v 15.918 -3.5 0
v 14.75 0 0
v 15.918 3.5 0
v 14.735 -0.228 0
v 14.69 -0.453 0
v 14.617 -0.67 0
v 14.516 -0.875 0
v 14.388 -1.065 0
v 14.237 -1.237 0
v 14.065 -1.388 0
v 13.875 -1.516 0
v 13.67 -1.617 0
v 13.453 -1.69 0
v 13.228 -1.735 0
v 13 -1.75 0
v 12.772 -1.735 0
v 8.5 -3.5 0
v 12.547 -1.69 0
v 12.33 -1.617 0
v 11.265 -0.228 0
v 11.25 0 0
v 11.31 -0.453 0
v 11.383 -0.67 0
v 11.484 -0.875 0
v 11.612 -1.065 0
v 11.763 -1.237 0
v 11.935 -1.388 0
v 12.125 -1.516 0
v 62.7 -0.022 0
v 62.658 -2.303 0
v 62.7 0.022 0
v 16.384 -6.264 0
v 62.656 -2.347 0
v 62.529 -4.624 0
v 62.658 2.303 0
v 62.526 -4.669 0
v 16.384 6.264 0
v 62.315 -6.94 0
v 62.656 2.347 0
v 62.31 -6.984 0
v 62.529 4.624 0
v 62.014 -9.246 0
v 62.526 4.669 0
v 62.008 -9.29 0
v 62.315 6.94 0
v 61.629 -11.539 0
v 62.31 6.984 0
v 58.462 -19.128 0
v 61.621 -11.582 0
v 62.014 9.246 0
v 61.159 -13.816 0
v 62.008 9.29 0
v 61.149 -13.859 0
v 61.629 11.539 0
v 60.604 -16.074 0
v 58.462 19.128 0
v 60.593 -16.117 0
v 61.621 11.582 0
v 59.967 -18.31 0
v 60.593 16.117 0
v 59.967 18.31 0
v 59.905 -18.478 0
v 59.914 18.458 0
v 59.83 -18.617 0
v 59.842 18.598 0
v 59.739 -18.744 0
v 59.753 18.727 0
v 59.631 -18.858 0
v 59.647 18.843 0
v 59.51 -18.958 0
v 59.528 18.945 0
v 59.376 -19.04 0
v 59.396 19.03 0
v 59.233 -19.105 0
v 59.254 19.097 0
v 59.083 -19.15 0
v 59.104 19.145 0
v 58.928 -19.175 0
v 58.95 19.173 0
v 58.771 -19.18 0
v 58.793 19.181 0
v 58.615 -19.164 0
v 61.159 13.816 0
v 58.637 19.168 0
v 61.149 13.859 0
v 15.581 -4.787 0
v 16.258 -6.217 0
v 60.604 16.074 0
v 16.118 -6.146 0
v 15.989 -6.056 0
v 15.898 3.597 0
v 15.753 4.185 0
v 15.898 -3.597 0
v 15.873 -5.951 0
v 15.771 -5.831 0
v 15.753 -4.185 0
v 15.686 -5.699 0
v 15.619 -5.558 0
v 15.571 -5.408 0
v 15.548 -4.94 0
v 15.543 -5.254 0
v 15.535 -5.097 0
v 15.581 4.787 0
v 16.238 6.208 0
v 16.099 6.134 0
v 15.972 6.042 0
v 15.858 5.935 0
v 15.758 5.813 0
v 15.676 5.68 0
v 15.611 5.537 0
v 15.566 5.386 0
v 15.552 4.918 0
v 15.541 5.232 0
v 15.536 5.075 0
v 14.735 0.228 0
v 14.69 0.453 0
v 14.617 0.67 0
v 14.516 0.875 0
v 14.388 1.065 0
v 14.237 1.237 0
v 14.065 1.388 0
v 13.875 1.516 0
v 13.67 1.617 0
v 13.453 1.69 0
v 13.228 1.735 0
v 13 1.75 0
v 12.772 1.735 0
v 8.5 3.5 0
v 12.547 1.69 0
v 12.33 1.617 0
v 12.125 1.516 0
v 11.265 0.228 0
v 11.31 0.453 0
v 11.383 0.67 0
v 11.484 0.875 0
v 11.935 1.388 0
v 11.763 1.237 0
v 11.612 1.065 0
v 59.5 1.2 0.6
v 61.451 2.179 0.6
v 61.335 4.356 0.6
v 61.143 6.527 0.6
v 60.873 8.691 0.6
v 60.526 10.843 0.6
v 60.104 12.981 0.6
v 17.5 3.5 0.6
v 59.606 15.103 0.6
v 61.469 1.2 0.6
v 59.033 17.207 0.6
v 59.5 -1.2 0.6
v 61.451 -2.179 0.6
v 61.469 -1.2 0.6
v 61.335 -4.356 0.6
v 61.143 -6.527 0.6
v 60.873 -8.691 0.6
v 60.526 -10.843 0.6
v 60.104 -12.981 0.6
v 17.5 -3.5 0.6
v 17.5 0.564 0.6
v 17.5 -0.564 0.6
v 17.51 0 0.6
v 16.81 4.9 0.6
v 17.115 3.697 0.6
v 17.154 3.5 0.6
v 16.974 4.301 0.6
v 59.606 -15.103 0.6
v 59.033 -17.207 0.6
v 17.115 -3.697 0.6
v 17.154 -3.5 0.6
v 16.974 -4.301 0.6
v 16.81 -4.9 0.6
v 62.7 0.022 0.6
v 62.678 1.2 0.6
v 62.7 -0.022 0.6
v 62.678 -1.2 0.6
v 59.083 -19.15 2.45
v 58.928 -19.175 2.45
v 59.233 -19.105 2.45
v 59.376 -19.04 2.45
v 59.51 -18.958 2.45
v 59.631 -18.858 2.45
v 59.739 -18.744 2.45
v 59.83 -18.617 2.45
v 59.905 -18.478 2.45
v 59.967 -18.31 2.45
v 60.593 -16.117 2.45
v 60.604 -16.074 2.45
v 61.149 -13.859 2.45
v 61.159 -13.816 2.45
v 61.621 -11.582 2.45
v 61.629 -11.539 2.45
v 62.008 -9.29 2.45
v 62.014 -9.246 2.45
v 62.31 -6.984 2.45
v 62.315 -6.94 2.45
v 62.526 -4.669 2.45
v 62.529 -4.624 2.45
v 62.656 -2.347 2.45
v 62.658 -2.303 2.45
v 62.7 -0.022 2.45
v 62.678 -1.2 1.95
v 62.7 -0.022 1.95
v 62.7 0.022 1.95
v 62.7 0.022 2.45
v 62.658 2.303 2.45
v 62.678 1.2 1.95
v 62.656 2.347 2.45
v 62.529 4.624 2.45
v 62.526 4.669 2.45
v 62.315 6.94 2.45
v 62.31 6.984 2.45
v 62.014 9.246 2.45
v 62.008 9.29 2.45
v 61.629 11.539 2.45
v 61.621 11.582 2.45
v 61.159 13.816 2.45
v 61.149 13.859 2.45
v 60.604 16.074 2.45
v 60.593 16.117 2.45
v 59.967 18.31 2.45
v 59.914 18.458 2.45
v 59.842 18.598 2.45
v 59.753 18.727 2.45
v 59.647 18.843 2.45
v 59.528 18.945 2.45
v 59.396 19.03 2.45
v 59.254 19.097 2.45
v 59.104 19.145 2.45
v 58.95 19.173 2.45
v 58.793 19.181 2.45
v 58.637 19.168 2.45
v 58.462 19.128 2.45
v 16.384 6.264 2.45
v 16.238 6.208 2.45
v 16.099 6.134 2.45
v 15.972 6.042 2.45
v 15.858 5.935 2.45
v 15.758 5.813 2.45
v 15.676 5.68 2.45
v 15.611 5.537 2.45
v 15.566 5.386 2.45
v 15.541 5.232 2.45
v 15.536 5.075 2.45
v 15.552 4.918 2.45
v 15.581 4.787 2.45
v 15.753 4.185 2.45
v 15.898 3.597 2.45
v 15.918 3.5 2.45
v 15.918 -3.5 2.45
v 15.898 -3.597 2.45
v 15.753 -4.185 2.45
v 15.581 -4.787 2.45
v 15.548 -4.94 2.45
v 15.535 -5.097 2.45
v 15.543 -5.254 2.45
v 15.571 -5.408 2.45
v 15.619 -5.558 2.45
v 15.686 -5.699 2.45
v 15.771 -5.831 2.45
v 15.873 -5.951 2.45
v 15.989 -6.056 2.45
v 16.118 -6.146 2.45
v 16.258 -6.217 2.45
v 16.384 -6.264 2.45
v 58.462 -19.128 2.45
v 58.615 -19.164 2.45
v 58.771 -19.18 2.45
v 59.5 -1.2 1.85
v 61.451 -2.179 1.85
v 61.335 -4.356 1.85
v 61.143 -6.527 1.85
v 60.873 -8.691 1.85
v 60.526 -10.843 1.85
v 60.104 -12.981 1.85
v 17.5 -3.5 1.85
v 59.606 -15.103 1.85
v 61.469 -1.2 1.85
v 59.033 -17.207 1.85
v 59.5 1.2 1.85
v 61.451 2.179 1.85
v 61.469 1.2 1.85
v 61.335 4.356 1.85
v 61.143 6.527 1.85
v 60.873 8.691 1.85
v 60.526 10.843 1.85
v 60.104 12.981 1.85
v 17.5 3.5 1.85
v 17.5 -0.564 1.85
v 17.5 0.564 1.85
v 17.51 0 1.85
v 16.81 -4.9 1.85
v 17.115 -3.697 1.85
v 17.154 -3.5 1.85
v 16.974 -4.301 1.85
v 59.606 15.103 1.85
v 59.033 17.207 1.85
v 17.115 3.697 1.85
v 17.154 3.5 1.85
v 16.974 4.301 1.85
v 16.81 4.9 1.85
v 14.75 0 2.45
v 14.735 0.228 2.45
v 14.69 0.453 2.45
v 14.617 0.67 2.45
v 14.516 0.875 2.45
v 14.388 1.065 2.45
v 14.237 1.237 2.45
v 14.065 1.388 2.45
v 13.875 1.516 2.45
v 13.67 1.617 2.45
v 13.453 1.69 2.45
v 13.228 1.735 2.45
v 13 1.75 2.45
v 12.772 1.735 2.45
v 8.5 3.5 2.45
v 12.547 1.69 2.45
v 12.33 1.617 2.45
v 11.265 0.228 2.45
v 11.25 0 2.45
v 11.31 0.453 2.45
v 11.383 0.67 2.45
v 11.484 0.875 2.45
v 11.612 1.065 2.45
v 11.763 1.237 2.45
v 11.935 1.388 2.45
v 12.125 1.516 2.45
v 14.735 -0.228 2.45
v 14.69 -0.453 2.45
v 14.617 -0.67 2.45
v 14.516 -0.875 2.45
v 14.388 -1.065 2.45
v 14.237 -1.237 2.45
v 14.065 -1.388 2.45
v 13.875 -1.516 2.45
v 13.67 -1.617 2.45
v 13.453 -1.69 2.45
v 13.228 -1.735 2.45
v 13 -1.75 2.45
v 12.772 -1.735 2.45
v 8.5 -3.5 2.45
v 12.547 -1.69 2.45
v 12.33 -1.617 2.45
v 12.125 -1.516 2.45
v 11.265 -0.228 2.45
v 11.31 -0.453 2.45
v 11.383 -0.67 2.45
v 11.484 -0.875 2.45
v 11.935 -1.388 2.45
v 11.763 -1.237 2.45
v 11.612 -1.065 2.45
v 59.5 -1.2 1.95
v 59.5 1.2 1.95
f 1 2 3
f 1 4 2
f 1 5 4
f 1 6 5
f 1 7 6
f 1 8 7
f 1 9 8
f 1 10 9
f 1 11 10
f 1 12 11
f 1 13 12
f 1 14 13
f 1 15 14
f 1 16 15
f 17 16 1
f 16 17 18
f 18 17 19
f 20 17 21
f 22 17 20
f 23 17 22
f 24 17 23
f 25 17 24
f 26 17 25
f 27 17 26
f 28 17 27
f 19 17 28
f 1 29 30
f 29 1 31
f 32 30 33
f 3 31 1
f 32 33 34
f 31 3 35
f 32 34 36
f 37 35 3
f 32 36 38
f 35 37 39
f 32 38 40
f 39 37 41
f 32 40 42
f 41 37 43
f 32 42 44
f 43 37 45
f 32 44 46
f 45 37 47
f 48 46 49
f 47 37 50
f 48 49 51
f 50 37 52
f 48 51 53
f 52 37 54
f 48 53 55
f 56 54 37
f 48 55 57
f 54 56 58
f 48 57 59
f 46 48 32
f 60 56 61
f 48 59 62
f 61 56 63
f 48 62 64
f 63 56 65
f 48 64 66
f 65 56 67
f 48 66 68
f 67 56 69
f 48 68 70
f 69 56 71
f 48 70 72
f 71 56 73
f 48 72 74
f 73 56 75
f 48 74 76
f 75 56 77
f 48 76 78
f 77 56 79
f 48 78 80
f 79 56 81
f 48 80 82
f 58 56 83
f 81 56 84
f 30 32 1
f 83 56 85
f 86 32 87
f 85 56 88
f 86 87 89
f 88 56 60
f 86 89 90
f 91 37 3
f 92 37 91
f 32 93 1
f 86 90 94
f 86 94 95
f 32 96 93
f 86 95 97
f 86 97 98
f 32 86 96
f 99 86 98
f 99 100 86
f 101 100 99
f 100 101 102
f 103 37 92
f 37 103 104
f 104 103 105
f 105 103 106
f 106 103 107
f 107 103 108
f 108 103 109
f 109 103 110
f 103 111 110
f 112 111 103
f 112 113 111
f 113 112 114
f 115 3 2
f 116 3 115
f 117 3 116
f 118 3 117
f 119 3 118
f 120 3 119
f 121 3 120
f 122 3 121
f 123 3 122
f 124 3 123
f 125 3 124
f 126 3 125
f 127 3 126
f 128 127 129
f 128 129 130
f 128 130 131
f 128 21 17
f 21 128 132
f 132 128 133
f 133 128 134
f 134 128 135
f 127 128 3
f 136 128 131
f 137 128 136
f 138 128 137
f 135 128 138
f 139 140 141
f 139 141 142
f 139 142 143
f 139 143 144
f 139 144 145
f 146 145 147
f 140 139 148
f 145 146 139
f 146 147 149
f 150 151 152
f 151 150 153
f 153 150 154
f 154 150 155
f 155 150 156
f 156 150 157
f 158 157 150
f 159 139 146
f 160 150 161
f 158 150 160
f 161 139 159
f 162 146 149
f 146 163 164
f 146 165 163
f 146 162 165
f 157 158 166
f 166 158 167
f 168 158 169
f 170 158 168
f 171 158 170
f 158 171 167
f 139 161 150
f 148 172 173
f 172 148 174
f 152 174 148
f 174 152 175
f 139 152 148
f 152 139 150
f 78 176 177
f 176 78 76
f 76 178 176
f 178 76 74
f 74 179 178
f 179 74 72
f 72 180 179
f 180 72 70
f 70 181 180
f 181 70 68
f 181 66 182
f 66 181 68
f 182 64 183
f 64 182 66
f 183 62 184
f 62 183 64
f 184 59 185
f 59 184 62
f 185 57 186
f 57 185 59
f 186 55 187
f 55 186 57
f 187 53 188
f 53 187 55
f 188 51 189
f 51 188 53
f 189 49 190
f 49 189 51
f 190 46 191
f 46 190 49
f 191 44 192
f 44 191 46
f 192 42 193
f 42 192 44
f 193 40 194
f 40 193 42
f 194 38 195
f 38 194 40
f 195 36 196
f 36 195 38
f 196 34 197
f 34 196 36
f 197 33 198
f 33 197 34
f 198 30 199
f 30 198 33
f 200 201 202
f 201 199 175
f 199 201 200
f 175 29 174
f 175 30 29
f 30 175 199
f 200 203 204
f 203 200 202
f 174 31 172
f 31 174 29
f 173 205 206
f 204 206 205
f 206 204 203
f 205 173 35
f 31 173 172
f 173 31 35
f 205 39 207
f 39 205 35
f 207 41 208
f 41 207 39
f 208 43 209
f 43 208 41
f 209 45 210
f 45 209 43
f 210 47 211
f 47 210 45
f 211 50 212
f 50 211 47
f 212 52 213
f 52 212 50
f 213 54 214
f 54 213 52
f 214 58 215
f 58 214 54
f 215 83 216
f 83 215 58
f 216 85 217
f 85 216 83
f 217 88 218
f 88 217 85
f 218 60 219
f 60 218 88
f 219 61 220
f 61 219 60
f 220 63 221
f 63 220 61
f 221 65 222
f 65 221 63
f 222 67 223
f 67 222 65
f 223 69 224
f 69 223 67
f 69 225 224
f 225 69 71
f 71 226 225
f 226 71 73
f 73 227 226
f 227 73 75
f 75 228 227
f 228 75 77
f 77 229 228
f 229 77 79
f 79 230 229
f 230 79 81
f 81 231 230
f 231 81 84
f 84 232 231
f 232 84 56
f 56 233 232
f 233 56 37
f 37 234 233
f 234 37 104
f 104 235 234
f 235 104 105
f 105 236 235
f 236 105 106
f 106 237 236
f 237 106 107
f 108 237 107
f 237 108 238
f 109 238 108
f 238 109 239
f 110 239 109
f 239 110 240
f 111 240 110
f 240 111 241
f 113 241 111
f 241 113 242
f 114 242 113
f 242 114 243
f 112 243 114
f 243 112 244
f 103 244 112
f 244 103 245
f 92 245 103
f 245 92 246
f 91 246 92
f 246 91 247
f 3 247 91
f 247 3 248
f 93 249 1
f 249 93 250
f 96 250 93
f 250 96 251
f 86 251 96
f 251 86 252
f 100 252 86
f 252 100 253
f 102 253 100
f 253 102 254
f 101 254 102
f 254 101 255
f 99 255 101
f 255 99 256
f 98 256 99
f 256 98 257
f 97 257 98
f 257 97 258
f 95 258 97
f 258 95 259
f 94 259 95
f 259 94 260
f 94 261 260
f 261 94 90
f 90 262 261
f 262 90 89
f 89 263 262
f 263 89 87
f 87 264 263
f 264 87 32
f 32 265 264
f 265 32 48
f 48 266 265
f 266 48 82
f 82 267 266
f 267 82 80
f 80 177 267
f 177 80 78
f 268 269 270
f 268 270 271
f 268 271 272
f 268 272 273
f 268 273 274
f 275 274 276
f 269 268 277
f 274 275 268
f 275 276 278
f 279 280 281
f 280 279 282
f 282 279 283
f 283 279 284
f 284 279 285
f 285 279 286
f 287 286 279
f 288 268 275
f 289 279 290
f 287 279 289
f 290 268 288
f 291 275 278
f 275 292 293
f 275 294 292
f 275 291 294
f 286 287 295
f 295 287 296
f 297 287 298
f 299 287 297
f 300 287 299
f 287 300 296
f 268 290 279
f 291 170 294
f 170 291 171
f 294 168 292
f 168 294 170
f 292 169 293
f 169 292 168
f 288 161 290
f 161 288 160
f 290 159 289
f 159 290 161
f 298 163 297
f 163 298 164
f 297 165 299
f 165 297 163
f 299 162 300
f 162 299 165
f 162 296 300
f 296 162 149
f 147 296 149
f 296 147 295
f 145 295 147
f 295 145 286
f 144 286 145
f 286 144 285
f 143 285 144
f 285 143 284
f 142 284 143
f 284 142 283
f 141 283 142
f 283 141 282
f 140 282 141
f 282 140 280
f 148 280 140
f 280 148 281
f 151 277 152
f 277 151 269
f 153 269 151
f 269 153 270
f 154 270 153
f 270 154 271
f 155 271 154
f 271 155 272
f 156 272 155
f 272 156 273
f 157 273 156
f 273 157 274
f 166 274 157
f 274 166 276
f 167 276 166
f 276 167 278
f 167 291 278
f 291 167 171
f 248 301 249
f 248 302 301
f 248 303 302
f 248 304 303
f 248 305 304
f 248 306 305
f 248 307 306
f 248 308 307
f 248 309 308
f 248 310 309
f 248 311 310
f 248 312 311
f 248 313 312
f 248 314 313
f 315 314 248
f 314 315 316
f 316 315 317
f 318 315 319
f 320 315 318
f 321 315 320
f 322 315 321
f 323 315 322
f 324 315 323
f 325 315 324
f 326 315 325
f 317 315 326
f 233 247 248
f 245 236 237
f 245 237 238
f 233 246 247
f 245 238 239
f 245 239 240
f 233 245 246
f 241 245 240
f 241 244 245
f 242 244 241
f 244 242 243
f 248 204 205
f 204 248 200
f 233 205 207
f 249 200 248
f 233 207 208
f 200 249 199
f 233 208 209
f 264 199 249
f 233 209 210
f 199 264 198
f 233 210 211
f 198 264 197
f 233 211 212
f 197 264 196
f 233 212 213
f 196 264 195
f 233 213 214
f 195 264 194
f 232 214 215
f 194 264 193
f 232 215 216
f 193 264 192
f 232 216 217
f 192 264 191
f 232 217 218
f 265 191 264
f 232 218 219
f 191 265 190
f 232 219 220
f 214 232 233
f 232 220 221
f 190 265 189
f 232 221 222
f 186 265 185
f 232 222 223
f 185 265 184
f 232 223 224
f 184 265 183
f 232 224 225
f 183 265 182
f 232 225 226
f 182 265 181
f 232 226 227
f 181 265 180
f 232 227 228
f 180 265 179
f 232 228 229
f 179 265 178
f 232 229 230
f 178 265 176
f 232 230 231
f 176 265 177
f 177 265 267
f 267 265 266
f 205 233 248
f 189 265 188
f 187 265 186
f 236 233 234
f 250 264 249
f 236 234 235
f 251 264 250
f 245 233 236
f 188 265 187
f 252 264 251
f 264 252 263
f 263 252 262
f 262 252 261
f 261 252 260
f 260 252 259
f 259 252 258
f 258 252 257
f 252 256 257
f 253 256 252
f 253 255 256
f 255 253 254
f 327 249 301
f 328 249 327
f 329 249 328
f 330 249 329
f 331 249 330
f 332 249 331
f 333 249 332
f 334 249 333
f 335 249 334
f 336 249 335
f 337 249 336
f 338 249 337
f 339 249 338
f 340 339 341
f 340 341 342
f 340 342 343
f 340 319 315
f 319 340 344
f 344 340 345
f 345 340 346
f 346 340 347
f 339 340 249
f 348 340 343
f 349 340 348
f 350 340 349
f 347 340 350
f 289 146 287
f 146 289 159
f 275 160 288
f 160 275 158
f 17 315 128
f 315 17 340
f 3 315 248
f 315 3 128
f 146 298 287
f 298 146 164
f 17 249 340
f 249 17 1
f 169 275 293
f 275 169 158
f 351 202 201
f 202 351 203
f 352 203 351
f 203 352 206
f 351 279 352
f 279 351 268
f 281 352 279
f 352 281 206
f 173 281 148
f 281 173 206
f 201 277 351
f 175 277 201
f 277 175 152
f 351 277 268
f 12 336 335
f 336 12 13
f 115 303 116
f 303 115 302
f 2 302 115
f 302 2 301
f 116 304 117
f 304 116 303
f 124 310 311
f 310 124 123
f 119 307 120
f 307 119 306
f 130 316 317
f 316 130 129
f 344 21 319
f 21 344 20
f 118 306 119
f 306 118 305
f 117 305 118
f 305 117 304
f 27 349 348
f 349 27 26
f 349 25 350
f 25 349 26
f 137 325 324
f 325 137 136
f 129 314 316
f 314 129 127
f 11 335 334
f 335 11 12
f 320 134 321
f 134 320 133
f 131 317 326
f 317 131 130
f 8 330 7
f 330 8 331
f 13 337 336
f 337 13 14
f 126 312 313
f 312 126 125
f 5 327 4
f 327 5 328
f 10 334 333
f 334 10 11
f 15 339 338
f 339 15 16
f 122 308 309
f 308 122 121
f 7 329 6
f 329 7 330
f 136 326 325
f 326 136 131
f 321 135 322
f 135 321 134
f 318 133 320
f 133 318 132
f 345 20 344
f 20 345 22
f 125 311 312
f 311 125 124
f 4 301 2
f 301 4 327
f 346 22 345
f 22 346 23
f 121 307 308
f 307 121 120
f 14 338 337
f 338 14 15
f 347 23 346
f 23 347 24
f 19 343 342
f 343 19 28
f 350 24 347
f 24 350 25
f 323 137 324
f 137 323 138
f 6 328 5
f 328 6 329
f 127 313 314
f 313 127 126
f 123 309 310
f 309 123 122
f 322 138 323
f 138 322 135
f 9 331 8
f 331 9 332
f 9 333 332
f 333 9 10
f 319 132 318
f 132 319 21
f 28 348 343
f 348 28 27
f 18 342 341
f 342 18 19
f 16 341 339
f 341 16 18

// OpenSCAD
// file: parameters.scad
// =============================================================================
// Gen-AR Stacked dual-stator mid-rotor copper-max hyper - WOUND-AWARE (HARD GATE)
// ONE mid dual-face Halbach rotor | TWO wound pancake stators | 18 coils x175 t
// =============================================================================

wire_awg            = 26;
wire_od             = 0.45;
turns               = 175;      // +10 vs Gen-AO 165; 18x175x~0.117 ~ 368 m
fill                = 0.70;
layers_per_face     = 2;
wind_build_axial    = layers_per_face * wire_od * fill;   // 0.63
wind_build_radial   = 3 * wire_od * fill;                 // 0.945

coil_id_r           = 17.5;
coil_od_r           = 61.5;
span_deg            = 34.0;     // 9 stations x 40 deg
former_web          = 1.25;     // thinner vs AO 1.30
flange_t            = 0.60;
wall                = 1.2;
slot_w              = 2.4;
mount_hole          = 3.5;
tab_len             = 7.0;

former_bare_h       = former_web + 2 * flange_t;            // 2.45
coil_envelope_h     = former_bare_h + 2 * wind_build_axial; // 3.71

run_clear           = 0.50;
gap_spacer_h        = run_clear + wind_build_axial;         // 1.13
m2m                 = coil_envelope_h + 2 * run_clear;      // 4.71 per gap

coil_stations       = 9;        // per stator; x2 = 18 total
bay_r_in            = coil_id_r - 2.0 - wind_build_radial;
bay_r_out           = coil_od_r + 2.0 + wind_build_radial;
bay_span            = span_deg + 4.0;
bay_offset          = 2.0;
bay_depth           = former_bare_h + wind_build_axial;     // wound sits in bay
stator_back_web     = 2.0;
stator_thick        = bay_depth + stator_back_web;
stator_od           = 156.0;
shaft_clear_stator  = 38.0;
coil_mount_r        = 27.0;

large_pocket_d      = 20.3;
small_pocket_d      = 5.3;
pocket_h            = 5.2;
large_n             = 8;
R_large             = 39.5;     // tighter copper overlap vs AO R=40
R_small_inner       = 26.0;
R_small_mid         = 39.5;
R_small_outer       = 56.0;
carrier_od          = 154.0;
mid_carrier_thick   = 12.0;
hub_h               = 10.0;
hub_od              = 30.0;
rotor_b_offset_deg  = 22.5;

shaft_bore          = 8.35;
bearing_d           = 21.85;
bearing_h           = 7.2;
m3_clear            = 3.5;
bolt_r_inner        = 36.0;
bolt_n_inner        = 6;
flange_bolt_r       = 72.0;
flange_bolt_n       = 6;
brace_r             = 68.0;
brace_d             = 4.3;
brace_n             = 4;

spacer_pad_od       = 14.0;
spacer_pad_id       = m3_clear;
endbell_od          = 156.0;
endbell_thick       = 8.0;
endbell_shaft_clear = 10.0;

$fn = 64;
// main file
// Gen-AR pancake former — wind BEFORE assembly
include <parameters.scad>;
$fn = 48;

module sector_2d(r_in, r_out, ang) {
    polygon([
        for (a = [-ang/2 : ang/16 : ang/2]) [r_in*cos(a), r_in*sin(a)],
        for (a = [ang/2 : -ang/16 : -ang/2]) [r_out*cos(a), r_out*sin(a)]
    ]);
}
module flange() {
    linear_extrude(flange_t) offset(r=wall) sector_2d(coil_id_r, coil_od_r, span_deg);
}
difference() {
    union() {
        flange();
        translate([0, 0, flange_t])
            linear_extrude(former_web)
                difference() {
                    offset(r=wall) sector_2d(coil_id_r, coil_od_r, span_deg);
                    sector_2d(coil_id_r + 0.01, coil_od_r - 0.01, span_deg - 1.5);
                }
        translate([0, 0, flange_t + former_web]) flange();
        translate([coil_id_r - tab_len - 2, -3.5, 0])
            cube([tab_len + 2, 7, former_bare_h]);
    }
    translate([coil_od_r - 2, -slot_w/2, flange_t])
        cube([wall + 4, slot_w, former_web + 0.1]);
    translate([coil_id_r - tab_len/2 - 1, 0, -0.1])
        cylinder(d=mount_hole, h=former_bare_h + 1);
}
